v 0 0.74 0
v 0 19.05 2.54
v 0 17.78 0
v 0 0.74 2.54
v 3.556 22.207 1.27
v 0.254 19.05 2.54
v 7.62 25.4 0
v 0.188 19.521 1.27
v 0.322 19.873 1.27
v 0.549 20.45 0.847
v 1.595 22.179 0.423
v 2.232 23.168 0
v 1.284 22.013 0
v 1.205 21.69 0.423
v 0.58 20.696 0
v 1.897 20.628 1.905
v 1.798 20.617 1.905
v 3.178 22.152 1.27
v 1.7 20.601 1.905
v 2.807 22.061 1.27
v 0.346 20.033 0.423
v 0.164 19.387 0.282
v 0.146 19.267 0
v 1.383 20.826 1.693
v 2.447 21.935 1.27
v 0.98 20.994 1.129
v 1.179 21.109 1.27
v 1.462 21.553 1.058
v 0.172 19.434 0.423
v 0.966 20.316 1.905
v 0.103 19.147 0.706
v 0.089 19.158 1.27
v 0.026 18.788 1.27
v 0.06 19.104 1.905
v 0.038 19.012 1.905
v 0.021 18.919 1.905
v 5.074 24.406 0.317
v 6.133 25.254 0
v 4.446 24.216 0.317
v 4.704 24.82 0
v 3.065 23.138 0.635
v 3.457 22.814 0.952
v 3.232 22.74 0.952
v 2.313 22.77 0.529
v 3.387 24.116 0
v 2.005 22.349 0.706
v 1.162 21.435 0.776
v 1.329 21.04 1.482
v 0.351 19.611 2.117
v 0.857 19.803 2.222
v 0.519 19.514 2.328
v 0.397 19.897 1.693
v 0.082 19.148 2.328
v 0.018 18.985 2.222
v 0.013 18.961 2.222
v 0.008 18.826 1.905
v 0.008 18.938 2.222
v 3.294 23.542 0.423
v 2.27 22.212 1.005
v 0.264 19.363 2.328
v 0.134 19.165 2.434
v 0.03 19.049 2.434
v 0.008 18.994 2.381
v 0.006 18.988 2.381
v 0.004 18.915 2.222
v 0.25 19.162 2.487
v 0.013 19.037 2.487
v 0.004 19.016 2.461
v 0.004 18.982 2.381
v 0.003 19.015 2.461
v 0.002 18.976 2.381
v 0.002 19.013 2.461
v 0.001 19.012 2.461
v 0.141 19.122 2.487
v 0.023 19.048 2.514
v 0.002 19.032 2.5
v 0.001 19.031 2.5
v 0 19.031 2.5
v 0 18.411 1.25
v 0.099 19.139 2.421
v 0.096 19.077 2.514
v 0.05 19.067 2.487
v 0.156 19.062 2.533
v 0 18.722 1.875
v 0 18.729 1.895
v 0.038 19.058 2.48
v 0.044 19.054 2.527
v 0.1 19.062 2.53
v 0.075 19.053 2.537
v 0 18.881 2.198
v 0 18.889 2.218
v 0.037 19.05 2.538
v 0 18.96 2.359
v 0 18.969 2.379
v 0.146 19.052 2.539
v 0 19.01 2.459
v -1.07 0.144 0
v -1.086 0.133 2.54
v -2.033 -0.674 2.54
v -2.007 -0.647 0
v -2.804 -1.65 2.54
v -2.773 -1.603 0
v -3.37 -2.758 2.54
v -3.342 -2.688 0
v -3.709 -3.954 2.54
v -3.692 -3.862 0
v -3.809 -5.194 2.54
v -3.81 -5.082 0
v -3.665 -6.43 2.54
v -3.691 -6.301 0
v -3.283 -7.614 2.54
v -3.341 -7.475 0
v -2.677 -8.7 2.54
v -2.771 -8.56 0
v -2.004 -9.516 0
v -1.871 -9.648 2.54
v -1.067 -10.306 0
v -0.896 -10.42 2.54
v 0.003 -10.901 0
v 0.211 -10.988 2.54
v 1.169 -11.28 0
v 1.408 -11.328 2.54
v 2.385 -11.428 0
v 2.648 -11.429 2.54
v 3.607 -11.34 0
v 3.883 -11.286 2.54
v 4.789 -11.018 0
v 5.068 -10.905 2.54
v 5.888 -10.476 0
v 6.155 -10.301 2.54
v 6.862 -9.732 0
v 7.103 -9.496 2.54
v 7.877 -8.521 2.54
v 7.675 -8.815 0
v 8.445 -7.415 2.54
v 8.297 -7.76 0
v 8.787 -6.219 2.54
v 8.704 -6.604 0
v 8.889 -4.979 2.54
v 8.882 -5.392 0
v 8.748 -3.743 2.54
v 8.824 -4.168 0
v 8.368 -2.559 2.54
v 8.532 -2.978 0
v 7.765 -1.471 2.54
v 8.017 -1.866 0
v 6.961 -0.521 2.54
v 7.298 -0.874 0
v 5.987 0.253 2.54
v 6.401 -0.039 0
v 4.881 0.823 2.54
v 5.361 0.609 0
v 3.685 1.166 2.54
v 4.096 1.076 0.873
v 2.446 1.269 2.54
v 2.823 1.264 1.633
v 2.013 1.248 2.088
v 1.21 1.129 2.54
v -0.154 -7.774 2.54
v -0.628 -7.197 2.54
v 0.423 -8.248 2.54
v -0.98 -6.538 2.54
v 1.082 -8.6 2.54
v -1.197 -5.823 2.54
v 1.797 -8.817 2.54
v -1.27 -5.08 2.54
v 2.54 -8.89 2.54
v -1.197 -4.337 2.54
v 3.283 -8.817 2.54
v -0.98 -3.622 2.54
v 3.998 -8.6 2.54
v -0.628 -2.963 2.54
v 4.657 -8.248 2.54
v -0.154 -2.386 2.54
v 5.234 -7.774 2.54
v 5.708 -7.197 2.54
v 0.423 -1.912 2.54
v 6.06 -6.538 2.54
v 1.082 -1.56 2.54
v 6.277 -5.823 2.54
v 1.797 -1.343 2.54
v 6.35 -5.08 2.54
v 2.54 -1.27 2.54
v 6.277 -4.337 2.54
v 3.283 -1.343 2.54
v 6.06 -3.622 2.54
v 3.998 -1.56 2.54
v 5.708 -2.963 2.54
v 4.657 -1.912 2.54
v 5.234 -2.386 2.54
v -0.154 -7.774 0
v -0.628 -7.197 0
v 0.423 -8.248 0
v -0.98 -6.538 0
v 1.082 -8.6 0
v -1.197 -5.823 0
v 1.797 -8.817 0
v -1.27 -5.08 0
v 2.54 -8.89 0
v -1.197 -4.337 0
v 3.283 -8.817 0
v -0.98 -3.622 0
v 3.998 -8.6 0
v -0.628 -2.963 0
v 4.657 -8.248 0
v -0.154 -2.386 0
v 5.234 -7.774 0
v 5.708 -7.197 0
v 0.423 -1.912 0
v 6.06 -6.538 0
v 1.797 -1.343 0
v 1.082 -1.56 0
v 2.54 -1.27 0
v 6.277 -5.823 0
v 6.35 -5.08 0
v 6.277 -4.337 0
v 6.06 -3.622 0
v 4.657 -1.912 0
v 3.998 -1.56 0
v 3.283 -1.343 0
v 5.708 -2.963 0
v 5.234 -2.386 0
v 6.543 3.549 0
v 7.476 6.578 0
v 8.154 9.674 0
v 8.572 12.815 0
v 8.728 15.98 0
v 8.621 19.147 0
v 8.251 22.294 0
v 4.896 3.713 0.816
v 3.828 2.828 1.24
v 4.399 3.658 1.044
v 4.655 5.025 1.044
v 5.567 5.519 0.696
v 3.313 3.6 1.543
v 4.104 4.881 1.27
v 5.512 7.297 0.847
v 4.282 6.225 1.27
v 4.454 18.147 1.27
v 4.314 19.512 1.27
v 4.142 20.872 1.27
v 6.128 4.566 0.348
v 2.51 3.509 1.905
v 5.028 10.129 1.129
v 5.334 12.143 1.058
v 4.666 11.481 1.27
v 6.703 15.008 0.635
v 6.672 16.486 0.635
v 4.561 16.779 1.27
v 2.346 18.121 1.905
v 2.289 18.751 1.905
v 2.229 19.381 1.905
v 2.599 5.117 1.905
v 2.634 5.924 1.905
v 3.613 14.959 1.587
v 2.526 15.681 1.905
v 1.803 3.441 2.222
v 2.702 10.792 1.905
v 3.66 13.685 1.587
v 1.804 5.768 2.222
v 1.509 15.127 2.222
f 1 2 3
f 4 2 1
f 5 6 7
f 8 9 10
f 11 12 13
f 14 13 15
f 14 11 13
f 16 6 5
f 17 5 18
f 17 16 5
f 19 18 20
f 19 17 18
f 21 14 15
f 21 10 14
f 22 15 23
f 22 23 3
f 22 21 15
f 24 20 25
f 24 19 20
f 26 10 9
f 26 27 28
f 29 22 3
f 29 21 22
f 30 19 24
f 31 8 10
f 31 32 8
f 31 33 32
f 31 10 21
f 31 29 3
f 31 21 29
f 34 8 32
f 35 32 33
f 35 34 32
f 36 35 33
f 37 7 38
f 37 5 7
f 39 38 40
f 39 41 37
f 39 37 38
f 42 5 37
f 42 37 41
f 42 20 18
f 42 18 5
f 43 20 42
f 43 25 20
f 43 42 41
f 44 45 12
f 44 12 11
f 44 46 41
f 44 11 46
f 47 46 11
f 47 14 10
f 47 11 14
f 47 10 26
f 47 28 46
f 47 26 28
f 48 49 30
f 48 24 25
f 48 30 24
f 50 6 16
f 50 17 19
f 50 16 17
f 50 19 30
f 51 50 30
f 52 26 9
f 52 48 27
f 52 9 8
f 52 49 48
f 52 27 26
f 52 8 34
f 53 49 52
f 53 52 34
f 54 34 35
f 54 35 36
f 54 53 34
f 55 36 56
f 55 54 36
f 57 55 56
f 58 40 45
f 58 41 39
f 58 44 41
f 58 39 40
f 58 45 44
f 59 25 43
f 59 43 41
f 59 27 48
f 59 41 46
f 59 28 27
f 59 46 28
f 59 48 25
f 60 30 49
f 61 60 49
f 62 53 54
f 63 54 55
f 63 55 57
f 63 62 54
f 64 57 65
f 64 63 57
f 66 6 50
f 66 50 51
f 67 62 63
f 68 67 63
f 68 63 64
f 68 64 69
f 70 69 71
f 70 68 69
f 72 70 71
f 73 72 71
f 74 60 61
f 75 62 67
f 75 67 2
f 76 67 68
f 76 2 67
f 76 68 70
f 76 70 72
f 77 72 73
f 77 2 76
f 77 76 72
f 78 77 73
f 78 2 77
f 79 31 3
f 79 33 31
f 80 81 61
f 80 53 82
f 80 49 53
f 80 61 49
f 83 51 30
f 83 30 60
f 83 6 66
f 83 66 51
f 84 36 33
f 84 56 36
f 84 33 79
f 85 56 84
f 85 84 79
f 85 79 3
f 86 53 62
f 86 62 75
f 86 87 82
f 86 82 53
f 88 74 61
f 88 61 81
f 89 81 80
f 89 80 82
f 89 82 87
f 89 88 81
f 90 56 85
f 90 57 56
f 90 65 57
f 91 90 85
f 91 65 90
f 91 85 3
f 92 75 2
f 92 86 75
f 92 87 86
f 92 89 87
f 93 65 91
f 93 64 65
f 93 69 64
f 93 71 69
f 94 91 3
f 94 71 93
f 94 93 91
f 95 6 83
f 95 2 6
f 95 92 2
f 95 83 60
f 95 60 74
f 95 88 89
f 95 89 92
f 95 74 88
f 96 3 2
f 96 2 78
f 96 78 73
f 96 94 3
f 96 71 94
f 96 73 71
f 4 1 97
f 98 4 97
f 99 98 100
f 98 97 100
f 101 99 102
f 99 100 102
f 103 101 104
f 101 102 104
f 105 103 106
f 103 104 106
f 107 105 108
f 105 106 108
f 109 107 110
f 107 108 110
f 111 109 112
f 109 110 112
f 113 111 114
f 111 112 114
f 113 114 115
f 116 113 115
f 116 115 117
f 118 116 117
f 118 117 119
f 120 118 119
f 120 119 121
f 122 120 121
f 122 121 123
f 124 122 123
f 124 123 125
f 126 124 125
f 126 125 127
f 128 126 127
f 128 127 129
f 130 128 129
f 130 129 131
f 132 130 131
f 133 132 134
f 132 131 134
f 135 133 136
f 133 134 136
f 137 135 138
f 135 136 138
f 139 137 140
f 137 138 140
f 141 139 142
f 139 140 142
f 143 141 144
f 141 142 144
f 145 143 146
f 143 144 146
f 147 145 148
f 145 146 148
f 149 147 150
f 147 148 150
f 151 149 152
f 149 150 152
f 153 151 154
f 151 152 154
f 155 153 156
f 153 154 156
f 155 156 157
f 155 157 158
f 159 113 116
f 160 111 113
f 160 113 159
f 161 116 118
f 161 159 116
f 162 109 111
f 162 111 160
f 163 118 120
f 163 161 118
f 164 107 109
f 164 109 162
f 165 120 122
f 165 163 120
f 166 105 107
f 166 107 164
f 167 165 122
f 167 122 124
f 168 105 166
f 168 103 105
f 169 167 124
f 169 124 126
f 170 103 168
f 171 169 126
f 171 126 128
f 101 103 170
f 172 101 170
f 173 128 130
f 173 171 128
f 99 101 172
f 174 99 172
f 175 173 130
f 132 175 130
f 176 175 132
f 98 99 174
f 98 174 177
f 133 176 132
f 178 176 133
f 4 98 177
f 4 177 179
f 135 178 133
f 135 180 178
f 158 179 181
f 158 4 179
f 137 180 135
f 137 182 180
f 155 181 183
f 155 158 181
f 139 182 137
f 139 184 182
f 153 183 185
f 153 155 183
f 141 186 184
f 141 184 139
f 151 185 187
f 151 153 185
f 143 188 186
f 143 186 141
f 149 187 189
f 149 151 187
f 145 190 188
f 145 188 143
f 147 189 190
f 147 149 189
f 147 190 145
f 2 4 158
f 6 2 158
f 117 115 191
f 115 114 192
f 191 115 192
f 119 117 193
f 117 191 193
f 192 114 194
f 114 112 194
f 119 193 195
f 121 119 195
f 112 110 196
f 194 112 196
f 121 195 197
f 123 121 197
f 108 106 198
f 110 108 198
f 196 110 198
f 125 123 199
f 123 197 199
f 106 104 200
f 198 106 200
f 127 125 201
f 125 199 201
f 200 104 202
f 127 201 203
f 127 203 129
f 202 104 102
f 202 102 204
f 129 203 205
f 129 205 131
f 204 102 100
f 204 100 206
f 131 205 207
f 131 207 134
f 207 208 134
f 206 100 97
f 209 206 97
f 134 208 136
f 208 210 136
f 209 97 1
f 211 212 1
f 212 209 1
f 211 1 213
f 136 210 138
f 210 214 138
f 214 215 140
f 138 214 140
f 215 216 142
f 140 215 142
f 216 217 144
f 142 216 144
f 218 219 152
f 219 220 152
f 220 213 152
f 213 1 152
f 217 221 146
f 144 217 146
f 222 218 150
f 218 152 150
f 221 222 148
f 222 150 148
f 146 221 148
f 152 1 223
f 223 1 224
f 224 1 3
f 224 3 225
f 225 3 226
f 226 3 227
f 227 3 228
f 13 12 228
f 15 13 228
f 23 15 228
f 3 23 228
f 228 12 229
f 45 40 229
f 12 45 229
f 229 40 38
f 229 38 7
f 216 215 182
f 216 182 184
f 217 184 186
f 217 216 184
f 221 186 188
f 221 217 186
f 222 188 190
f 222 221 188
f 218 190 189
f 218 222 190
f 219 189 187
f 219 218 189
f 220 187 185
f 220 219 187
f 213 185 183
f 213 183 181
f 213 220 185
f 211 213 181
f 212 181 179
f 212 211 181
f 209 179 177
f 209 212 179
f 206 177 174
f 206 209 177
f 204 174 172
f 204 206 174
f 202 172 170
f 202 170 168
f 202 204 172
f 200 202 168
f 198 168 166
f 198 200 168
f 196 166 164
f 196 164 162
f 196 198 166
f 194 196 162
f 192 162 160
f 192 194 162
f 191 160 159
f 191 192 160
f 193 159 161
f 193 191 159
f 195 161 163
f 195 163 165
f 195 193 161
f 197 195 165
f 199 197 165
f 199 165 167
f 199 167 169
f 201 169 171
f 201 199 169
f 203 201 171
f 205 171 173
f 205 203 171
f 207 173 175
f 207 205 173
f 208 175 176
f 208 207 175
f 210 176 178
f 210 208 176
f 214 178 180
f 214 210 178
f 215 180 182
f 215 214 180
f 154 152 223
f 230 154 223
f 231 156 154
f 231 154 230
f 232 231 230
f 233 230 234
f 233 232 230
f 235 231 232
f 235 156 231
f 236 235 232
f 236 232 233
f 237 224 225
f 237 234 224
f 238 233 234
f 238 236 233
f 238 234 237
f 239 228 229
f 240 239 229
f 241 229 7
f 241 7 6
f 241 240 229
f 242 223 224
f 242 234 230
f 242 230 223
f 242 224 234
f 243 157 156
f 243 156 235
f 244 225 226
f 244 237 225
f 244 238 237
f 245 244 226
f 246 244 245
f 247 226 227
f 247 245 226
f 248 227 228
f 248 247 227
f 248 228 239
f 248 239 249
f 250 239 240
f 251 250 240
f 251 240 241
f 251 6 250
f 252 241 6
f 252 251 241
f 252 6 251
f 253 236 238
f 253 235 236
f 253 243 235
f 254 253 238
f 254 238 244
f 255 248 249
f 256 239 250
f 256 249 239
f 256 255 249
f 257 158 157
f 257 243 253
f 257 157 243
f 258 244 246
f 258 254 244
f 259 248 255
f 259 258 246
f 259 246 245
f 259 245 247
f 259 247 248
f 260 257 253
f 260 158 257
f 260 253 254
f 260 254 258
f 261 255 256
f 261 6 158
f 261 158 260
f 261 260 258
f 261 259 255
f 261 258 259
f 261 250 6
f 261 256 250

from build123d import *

# Parameters (mm, degrees)
F4_R     = 6.35
F4_R_2   = 3.81
F5_DEPTH = 2.54


with BuildPart() as f3:
    # F0 (on Top) → F3 section 0
    with BuildSketch(Plane.XY):
        with BuildLine():
            Line((0, 17.78), (0, 0))
            Line((0, 0), (5.08, 0))
            ThreePointArc((5.08, 0), (8.5405078821, 12.4809492118), (7.62, 25.4))
            ThreePointArc((7.62, 25.4), (2.2318463274, 23.1681536726), (0, 17.78))
        make_face()
    # F2 (on offset) → F3 section 1
    with BuildSketch(Plane.XY.offset(2.54)):
        Polygon((0, 19.05), (0, 0), (1.27, 0), (0.254, 19.05), align=None)
    loft()

    # F4 (on Top) → F5 (join, through all)
    with BuildSketch(Plane.XY):
        with Locations((2.54, -5.08)):
            Circle(F4_R)
        with Locations((2.54, -5.08)):
            Circle(F4_R_2, mode=Mode.SUBTRACT)
    extrude(amount=F5_DEPTH)


solid = f3.part
